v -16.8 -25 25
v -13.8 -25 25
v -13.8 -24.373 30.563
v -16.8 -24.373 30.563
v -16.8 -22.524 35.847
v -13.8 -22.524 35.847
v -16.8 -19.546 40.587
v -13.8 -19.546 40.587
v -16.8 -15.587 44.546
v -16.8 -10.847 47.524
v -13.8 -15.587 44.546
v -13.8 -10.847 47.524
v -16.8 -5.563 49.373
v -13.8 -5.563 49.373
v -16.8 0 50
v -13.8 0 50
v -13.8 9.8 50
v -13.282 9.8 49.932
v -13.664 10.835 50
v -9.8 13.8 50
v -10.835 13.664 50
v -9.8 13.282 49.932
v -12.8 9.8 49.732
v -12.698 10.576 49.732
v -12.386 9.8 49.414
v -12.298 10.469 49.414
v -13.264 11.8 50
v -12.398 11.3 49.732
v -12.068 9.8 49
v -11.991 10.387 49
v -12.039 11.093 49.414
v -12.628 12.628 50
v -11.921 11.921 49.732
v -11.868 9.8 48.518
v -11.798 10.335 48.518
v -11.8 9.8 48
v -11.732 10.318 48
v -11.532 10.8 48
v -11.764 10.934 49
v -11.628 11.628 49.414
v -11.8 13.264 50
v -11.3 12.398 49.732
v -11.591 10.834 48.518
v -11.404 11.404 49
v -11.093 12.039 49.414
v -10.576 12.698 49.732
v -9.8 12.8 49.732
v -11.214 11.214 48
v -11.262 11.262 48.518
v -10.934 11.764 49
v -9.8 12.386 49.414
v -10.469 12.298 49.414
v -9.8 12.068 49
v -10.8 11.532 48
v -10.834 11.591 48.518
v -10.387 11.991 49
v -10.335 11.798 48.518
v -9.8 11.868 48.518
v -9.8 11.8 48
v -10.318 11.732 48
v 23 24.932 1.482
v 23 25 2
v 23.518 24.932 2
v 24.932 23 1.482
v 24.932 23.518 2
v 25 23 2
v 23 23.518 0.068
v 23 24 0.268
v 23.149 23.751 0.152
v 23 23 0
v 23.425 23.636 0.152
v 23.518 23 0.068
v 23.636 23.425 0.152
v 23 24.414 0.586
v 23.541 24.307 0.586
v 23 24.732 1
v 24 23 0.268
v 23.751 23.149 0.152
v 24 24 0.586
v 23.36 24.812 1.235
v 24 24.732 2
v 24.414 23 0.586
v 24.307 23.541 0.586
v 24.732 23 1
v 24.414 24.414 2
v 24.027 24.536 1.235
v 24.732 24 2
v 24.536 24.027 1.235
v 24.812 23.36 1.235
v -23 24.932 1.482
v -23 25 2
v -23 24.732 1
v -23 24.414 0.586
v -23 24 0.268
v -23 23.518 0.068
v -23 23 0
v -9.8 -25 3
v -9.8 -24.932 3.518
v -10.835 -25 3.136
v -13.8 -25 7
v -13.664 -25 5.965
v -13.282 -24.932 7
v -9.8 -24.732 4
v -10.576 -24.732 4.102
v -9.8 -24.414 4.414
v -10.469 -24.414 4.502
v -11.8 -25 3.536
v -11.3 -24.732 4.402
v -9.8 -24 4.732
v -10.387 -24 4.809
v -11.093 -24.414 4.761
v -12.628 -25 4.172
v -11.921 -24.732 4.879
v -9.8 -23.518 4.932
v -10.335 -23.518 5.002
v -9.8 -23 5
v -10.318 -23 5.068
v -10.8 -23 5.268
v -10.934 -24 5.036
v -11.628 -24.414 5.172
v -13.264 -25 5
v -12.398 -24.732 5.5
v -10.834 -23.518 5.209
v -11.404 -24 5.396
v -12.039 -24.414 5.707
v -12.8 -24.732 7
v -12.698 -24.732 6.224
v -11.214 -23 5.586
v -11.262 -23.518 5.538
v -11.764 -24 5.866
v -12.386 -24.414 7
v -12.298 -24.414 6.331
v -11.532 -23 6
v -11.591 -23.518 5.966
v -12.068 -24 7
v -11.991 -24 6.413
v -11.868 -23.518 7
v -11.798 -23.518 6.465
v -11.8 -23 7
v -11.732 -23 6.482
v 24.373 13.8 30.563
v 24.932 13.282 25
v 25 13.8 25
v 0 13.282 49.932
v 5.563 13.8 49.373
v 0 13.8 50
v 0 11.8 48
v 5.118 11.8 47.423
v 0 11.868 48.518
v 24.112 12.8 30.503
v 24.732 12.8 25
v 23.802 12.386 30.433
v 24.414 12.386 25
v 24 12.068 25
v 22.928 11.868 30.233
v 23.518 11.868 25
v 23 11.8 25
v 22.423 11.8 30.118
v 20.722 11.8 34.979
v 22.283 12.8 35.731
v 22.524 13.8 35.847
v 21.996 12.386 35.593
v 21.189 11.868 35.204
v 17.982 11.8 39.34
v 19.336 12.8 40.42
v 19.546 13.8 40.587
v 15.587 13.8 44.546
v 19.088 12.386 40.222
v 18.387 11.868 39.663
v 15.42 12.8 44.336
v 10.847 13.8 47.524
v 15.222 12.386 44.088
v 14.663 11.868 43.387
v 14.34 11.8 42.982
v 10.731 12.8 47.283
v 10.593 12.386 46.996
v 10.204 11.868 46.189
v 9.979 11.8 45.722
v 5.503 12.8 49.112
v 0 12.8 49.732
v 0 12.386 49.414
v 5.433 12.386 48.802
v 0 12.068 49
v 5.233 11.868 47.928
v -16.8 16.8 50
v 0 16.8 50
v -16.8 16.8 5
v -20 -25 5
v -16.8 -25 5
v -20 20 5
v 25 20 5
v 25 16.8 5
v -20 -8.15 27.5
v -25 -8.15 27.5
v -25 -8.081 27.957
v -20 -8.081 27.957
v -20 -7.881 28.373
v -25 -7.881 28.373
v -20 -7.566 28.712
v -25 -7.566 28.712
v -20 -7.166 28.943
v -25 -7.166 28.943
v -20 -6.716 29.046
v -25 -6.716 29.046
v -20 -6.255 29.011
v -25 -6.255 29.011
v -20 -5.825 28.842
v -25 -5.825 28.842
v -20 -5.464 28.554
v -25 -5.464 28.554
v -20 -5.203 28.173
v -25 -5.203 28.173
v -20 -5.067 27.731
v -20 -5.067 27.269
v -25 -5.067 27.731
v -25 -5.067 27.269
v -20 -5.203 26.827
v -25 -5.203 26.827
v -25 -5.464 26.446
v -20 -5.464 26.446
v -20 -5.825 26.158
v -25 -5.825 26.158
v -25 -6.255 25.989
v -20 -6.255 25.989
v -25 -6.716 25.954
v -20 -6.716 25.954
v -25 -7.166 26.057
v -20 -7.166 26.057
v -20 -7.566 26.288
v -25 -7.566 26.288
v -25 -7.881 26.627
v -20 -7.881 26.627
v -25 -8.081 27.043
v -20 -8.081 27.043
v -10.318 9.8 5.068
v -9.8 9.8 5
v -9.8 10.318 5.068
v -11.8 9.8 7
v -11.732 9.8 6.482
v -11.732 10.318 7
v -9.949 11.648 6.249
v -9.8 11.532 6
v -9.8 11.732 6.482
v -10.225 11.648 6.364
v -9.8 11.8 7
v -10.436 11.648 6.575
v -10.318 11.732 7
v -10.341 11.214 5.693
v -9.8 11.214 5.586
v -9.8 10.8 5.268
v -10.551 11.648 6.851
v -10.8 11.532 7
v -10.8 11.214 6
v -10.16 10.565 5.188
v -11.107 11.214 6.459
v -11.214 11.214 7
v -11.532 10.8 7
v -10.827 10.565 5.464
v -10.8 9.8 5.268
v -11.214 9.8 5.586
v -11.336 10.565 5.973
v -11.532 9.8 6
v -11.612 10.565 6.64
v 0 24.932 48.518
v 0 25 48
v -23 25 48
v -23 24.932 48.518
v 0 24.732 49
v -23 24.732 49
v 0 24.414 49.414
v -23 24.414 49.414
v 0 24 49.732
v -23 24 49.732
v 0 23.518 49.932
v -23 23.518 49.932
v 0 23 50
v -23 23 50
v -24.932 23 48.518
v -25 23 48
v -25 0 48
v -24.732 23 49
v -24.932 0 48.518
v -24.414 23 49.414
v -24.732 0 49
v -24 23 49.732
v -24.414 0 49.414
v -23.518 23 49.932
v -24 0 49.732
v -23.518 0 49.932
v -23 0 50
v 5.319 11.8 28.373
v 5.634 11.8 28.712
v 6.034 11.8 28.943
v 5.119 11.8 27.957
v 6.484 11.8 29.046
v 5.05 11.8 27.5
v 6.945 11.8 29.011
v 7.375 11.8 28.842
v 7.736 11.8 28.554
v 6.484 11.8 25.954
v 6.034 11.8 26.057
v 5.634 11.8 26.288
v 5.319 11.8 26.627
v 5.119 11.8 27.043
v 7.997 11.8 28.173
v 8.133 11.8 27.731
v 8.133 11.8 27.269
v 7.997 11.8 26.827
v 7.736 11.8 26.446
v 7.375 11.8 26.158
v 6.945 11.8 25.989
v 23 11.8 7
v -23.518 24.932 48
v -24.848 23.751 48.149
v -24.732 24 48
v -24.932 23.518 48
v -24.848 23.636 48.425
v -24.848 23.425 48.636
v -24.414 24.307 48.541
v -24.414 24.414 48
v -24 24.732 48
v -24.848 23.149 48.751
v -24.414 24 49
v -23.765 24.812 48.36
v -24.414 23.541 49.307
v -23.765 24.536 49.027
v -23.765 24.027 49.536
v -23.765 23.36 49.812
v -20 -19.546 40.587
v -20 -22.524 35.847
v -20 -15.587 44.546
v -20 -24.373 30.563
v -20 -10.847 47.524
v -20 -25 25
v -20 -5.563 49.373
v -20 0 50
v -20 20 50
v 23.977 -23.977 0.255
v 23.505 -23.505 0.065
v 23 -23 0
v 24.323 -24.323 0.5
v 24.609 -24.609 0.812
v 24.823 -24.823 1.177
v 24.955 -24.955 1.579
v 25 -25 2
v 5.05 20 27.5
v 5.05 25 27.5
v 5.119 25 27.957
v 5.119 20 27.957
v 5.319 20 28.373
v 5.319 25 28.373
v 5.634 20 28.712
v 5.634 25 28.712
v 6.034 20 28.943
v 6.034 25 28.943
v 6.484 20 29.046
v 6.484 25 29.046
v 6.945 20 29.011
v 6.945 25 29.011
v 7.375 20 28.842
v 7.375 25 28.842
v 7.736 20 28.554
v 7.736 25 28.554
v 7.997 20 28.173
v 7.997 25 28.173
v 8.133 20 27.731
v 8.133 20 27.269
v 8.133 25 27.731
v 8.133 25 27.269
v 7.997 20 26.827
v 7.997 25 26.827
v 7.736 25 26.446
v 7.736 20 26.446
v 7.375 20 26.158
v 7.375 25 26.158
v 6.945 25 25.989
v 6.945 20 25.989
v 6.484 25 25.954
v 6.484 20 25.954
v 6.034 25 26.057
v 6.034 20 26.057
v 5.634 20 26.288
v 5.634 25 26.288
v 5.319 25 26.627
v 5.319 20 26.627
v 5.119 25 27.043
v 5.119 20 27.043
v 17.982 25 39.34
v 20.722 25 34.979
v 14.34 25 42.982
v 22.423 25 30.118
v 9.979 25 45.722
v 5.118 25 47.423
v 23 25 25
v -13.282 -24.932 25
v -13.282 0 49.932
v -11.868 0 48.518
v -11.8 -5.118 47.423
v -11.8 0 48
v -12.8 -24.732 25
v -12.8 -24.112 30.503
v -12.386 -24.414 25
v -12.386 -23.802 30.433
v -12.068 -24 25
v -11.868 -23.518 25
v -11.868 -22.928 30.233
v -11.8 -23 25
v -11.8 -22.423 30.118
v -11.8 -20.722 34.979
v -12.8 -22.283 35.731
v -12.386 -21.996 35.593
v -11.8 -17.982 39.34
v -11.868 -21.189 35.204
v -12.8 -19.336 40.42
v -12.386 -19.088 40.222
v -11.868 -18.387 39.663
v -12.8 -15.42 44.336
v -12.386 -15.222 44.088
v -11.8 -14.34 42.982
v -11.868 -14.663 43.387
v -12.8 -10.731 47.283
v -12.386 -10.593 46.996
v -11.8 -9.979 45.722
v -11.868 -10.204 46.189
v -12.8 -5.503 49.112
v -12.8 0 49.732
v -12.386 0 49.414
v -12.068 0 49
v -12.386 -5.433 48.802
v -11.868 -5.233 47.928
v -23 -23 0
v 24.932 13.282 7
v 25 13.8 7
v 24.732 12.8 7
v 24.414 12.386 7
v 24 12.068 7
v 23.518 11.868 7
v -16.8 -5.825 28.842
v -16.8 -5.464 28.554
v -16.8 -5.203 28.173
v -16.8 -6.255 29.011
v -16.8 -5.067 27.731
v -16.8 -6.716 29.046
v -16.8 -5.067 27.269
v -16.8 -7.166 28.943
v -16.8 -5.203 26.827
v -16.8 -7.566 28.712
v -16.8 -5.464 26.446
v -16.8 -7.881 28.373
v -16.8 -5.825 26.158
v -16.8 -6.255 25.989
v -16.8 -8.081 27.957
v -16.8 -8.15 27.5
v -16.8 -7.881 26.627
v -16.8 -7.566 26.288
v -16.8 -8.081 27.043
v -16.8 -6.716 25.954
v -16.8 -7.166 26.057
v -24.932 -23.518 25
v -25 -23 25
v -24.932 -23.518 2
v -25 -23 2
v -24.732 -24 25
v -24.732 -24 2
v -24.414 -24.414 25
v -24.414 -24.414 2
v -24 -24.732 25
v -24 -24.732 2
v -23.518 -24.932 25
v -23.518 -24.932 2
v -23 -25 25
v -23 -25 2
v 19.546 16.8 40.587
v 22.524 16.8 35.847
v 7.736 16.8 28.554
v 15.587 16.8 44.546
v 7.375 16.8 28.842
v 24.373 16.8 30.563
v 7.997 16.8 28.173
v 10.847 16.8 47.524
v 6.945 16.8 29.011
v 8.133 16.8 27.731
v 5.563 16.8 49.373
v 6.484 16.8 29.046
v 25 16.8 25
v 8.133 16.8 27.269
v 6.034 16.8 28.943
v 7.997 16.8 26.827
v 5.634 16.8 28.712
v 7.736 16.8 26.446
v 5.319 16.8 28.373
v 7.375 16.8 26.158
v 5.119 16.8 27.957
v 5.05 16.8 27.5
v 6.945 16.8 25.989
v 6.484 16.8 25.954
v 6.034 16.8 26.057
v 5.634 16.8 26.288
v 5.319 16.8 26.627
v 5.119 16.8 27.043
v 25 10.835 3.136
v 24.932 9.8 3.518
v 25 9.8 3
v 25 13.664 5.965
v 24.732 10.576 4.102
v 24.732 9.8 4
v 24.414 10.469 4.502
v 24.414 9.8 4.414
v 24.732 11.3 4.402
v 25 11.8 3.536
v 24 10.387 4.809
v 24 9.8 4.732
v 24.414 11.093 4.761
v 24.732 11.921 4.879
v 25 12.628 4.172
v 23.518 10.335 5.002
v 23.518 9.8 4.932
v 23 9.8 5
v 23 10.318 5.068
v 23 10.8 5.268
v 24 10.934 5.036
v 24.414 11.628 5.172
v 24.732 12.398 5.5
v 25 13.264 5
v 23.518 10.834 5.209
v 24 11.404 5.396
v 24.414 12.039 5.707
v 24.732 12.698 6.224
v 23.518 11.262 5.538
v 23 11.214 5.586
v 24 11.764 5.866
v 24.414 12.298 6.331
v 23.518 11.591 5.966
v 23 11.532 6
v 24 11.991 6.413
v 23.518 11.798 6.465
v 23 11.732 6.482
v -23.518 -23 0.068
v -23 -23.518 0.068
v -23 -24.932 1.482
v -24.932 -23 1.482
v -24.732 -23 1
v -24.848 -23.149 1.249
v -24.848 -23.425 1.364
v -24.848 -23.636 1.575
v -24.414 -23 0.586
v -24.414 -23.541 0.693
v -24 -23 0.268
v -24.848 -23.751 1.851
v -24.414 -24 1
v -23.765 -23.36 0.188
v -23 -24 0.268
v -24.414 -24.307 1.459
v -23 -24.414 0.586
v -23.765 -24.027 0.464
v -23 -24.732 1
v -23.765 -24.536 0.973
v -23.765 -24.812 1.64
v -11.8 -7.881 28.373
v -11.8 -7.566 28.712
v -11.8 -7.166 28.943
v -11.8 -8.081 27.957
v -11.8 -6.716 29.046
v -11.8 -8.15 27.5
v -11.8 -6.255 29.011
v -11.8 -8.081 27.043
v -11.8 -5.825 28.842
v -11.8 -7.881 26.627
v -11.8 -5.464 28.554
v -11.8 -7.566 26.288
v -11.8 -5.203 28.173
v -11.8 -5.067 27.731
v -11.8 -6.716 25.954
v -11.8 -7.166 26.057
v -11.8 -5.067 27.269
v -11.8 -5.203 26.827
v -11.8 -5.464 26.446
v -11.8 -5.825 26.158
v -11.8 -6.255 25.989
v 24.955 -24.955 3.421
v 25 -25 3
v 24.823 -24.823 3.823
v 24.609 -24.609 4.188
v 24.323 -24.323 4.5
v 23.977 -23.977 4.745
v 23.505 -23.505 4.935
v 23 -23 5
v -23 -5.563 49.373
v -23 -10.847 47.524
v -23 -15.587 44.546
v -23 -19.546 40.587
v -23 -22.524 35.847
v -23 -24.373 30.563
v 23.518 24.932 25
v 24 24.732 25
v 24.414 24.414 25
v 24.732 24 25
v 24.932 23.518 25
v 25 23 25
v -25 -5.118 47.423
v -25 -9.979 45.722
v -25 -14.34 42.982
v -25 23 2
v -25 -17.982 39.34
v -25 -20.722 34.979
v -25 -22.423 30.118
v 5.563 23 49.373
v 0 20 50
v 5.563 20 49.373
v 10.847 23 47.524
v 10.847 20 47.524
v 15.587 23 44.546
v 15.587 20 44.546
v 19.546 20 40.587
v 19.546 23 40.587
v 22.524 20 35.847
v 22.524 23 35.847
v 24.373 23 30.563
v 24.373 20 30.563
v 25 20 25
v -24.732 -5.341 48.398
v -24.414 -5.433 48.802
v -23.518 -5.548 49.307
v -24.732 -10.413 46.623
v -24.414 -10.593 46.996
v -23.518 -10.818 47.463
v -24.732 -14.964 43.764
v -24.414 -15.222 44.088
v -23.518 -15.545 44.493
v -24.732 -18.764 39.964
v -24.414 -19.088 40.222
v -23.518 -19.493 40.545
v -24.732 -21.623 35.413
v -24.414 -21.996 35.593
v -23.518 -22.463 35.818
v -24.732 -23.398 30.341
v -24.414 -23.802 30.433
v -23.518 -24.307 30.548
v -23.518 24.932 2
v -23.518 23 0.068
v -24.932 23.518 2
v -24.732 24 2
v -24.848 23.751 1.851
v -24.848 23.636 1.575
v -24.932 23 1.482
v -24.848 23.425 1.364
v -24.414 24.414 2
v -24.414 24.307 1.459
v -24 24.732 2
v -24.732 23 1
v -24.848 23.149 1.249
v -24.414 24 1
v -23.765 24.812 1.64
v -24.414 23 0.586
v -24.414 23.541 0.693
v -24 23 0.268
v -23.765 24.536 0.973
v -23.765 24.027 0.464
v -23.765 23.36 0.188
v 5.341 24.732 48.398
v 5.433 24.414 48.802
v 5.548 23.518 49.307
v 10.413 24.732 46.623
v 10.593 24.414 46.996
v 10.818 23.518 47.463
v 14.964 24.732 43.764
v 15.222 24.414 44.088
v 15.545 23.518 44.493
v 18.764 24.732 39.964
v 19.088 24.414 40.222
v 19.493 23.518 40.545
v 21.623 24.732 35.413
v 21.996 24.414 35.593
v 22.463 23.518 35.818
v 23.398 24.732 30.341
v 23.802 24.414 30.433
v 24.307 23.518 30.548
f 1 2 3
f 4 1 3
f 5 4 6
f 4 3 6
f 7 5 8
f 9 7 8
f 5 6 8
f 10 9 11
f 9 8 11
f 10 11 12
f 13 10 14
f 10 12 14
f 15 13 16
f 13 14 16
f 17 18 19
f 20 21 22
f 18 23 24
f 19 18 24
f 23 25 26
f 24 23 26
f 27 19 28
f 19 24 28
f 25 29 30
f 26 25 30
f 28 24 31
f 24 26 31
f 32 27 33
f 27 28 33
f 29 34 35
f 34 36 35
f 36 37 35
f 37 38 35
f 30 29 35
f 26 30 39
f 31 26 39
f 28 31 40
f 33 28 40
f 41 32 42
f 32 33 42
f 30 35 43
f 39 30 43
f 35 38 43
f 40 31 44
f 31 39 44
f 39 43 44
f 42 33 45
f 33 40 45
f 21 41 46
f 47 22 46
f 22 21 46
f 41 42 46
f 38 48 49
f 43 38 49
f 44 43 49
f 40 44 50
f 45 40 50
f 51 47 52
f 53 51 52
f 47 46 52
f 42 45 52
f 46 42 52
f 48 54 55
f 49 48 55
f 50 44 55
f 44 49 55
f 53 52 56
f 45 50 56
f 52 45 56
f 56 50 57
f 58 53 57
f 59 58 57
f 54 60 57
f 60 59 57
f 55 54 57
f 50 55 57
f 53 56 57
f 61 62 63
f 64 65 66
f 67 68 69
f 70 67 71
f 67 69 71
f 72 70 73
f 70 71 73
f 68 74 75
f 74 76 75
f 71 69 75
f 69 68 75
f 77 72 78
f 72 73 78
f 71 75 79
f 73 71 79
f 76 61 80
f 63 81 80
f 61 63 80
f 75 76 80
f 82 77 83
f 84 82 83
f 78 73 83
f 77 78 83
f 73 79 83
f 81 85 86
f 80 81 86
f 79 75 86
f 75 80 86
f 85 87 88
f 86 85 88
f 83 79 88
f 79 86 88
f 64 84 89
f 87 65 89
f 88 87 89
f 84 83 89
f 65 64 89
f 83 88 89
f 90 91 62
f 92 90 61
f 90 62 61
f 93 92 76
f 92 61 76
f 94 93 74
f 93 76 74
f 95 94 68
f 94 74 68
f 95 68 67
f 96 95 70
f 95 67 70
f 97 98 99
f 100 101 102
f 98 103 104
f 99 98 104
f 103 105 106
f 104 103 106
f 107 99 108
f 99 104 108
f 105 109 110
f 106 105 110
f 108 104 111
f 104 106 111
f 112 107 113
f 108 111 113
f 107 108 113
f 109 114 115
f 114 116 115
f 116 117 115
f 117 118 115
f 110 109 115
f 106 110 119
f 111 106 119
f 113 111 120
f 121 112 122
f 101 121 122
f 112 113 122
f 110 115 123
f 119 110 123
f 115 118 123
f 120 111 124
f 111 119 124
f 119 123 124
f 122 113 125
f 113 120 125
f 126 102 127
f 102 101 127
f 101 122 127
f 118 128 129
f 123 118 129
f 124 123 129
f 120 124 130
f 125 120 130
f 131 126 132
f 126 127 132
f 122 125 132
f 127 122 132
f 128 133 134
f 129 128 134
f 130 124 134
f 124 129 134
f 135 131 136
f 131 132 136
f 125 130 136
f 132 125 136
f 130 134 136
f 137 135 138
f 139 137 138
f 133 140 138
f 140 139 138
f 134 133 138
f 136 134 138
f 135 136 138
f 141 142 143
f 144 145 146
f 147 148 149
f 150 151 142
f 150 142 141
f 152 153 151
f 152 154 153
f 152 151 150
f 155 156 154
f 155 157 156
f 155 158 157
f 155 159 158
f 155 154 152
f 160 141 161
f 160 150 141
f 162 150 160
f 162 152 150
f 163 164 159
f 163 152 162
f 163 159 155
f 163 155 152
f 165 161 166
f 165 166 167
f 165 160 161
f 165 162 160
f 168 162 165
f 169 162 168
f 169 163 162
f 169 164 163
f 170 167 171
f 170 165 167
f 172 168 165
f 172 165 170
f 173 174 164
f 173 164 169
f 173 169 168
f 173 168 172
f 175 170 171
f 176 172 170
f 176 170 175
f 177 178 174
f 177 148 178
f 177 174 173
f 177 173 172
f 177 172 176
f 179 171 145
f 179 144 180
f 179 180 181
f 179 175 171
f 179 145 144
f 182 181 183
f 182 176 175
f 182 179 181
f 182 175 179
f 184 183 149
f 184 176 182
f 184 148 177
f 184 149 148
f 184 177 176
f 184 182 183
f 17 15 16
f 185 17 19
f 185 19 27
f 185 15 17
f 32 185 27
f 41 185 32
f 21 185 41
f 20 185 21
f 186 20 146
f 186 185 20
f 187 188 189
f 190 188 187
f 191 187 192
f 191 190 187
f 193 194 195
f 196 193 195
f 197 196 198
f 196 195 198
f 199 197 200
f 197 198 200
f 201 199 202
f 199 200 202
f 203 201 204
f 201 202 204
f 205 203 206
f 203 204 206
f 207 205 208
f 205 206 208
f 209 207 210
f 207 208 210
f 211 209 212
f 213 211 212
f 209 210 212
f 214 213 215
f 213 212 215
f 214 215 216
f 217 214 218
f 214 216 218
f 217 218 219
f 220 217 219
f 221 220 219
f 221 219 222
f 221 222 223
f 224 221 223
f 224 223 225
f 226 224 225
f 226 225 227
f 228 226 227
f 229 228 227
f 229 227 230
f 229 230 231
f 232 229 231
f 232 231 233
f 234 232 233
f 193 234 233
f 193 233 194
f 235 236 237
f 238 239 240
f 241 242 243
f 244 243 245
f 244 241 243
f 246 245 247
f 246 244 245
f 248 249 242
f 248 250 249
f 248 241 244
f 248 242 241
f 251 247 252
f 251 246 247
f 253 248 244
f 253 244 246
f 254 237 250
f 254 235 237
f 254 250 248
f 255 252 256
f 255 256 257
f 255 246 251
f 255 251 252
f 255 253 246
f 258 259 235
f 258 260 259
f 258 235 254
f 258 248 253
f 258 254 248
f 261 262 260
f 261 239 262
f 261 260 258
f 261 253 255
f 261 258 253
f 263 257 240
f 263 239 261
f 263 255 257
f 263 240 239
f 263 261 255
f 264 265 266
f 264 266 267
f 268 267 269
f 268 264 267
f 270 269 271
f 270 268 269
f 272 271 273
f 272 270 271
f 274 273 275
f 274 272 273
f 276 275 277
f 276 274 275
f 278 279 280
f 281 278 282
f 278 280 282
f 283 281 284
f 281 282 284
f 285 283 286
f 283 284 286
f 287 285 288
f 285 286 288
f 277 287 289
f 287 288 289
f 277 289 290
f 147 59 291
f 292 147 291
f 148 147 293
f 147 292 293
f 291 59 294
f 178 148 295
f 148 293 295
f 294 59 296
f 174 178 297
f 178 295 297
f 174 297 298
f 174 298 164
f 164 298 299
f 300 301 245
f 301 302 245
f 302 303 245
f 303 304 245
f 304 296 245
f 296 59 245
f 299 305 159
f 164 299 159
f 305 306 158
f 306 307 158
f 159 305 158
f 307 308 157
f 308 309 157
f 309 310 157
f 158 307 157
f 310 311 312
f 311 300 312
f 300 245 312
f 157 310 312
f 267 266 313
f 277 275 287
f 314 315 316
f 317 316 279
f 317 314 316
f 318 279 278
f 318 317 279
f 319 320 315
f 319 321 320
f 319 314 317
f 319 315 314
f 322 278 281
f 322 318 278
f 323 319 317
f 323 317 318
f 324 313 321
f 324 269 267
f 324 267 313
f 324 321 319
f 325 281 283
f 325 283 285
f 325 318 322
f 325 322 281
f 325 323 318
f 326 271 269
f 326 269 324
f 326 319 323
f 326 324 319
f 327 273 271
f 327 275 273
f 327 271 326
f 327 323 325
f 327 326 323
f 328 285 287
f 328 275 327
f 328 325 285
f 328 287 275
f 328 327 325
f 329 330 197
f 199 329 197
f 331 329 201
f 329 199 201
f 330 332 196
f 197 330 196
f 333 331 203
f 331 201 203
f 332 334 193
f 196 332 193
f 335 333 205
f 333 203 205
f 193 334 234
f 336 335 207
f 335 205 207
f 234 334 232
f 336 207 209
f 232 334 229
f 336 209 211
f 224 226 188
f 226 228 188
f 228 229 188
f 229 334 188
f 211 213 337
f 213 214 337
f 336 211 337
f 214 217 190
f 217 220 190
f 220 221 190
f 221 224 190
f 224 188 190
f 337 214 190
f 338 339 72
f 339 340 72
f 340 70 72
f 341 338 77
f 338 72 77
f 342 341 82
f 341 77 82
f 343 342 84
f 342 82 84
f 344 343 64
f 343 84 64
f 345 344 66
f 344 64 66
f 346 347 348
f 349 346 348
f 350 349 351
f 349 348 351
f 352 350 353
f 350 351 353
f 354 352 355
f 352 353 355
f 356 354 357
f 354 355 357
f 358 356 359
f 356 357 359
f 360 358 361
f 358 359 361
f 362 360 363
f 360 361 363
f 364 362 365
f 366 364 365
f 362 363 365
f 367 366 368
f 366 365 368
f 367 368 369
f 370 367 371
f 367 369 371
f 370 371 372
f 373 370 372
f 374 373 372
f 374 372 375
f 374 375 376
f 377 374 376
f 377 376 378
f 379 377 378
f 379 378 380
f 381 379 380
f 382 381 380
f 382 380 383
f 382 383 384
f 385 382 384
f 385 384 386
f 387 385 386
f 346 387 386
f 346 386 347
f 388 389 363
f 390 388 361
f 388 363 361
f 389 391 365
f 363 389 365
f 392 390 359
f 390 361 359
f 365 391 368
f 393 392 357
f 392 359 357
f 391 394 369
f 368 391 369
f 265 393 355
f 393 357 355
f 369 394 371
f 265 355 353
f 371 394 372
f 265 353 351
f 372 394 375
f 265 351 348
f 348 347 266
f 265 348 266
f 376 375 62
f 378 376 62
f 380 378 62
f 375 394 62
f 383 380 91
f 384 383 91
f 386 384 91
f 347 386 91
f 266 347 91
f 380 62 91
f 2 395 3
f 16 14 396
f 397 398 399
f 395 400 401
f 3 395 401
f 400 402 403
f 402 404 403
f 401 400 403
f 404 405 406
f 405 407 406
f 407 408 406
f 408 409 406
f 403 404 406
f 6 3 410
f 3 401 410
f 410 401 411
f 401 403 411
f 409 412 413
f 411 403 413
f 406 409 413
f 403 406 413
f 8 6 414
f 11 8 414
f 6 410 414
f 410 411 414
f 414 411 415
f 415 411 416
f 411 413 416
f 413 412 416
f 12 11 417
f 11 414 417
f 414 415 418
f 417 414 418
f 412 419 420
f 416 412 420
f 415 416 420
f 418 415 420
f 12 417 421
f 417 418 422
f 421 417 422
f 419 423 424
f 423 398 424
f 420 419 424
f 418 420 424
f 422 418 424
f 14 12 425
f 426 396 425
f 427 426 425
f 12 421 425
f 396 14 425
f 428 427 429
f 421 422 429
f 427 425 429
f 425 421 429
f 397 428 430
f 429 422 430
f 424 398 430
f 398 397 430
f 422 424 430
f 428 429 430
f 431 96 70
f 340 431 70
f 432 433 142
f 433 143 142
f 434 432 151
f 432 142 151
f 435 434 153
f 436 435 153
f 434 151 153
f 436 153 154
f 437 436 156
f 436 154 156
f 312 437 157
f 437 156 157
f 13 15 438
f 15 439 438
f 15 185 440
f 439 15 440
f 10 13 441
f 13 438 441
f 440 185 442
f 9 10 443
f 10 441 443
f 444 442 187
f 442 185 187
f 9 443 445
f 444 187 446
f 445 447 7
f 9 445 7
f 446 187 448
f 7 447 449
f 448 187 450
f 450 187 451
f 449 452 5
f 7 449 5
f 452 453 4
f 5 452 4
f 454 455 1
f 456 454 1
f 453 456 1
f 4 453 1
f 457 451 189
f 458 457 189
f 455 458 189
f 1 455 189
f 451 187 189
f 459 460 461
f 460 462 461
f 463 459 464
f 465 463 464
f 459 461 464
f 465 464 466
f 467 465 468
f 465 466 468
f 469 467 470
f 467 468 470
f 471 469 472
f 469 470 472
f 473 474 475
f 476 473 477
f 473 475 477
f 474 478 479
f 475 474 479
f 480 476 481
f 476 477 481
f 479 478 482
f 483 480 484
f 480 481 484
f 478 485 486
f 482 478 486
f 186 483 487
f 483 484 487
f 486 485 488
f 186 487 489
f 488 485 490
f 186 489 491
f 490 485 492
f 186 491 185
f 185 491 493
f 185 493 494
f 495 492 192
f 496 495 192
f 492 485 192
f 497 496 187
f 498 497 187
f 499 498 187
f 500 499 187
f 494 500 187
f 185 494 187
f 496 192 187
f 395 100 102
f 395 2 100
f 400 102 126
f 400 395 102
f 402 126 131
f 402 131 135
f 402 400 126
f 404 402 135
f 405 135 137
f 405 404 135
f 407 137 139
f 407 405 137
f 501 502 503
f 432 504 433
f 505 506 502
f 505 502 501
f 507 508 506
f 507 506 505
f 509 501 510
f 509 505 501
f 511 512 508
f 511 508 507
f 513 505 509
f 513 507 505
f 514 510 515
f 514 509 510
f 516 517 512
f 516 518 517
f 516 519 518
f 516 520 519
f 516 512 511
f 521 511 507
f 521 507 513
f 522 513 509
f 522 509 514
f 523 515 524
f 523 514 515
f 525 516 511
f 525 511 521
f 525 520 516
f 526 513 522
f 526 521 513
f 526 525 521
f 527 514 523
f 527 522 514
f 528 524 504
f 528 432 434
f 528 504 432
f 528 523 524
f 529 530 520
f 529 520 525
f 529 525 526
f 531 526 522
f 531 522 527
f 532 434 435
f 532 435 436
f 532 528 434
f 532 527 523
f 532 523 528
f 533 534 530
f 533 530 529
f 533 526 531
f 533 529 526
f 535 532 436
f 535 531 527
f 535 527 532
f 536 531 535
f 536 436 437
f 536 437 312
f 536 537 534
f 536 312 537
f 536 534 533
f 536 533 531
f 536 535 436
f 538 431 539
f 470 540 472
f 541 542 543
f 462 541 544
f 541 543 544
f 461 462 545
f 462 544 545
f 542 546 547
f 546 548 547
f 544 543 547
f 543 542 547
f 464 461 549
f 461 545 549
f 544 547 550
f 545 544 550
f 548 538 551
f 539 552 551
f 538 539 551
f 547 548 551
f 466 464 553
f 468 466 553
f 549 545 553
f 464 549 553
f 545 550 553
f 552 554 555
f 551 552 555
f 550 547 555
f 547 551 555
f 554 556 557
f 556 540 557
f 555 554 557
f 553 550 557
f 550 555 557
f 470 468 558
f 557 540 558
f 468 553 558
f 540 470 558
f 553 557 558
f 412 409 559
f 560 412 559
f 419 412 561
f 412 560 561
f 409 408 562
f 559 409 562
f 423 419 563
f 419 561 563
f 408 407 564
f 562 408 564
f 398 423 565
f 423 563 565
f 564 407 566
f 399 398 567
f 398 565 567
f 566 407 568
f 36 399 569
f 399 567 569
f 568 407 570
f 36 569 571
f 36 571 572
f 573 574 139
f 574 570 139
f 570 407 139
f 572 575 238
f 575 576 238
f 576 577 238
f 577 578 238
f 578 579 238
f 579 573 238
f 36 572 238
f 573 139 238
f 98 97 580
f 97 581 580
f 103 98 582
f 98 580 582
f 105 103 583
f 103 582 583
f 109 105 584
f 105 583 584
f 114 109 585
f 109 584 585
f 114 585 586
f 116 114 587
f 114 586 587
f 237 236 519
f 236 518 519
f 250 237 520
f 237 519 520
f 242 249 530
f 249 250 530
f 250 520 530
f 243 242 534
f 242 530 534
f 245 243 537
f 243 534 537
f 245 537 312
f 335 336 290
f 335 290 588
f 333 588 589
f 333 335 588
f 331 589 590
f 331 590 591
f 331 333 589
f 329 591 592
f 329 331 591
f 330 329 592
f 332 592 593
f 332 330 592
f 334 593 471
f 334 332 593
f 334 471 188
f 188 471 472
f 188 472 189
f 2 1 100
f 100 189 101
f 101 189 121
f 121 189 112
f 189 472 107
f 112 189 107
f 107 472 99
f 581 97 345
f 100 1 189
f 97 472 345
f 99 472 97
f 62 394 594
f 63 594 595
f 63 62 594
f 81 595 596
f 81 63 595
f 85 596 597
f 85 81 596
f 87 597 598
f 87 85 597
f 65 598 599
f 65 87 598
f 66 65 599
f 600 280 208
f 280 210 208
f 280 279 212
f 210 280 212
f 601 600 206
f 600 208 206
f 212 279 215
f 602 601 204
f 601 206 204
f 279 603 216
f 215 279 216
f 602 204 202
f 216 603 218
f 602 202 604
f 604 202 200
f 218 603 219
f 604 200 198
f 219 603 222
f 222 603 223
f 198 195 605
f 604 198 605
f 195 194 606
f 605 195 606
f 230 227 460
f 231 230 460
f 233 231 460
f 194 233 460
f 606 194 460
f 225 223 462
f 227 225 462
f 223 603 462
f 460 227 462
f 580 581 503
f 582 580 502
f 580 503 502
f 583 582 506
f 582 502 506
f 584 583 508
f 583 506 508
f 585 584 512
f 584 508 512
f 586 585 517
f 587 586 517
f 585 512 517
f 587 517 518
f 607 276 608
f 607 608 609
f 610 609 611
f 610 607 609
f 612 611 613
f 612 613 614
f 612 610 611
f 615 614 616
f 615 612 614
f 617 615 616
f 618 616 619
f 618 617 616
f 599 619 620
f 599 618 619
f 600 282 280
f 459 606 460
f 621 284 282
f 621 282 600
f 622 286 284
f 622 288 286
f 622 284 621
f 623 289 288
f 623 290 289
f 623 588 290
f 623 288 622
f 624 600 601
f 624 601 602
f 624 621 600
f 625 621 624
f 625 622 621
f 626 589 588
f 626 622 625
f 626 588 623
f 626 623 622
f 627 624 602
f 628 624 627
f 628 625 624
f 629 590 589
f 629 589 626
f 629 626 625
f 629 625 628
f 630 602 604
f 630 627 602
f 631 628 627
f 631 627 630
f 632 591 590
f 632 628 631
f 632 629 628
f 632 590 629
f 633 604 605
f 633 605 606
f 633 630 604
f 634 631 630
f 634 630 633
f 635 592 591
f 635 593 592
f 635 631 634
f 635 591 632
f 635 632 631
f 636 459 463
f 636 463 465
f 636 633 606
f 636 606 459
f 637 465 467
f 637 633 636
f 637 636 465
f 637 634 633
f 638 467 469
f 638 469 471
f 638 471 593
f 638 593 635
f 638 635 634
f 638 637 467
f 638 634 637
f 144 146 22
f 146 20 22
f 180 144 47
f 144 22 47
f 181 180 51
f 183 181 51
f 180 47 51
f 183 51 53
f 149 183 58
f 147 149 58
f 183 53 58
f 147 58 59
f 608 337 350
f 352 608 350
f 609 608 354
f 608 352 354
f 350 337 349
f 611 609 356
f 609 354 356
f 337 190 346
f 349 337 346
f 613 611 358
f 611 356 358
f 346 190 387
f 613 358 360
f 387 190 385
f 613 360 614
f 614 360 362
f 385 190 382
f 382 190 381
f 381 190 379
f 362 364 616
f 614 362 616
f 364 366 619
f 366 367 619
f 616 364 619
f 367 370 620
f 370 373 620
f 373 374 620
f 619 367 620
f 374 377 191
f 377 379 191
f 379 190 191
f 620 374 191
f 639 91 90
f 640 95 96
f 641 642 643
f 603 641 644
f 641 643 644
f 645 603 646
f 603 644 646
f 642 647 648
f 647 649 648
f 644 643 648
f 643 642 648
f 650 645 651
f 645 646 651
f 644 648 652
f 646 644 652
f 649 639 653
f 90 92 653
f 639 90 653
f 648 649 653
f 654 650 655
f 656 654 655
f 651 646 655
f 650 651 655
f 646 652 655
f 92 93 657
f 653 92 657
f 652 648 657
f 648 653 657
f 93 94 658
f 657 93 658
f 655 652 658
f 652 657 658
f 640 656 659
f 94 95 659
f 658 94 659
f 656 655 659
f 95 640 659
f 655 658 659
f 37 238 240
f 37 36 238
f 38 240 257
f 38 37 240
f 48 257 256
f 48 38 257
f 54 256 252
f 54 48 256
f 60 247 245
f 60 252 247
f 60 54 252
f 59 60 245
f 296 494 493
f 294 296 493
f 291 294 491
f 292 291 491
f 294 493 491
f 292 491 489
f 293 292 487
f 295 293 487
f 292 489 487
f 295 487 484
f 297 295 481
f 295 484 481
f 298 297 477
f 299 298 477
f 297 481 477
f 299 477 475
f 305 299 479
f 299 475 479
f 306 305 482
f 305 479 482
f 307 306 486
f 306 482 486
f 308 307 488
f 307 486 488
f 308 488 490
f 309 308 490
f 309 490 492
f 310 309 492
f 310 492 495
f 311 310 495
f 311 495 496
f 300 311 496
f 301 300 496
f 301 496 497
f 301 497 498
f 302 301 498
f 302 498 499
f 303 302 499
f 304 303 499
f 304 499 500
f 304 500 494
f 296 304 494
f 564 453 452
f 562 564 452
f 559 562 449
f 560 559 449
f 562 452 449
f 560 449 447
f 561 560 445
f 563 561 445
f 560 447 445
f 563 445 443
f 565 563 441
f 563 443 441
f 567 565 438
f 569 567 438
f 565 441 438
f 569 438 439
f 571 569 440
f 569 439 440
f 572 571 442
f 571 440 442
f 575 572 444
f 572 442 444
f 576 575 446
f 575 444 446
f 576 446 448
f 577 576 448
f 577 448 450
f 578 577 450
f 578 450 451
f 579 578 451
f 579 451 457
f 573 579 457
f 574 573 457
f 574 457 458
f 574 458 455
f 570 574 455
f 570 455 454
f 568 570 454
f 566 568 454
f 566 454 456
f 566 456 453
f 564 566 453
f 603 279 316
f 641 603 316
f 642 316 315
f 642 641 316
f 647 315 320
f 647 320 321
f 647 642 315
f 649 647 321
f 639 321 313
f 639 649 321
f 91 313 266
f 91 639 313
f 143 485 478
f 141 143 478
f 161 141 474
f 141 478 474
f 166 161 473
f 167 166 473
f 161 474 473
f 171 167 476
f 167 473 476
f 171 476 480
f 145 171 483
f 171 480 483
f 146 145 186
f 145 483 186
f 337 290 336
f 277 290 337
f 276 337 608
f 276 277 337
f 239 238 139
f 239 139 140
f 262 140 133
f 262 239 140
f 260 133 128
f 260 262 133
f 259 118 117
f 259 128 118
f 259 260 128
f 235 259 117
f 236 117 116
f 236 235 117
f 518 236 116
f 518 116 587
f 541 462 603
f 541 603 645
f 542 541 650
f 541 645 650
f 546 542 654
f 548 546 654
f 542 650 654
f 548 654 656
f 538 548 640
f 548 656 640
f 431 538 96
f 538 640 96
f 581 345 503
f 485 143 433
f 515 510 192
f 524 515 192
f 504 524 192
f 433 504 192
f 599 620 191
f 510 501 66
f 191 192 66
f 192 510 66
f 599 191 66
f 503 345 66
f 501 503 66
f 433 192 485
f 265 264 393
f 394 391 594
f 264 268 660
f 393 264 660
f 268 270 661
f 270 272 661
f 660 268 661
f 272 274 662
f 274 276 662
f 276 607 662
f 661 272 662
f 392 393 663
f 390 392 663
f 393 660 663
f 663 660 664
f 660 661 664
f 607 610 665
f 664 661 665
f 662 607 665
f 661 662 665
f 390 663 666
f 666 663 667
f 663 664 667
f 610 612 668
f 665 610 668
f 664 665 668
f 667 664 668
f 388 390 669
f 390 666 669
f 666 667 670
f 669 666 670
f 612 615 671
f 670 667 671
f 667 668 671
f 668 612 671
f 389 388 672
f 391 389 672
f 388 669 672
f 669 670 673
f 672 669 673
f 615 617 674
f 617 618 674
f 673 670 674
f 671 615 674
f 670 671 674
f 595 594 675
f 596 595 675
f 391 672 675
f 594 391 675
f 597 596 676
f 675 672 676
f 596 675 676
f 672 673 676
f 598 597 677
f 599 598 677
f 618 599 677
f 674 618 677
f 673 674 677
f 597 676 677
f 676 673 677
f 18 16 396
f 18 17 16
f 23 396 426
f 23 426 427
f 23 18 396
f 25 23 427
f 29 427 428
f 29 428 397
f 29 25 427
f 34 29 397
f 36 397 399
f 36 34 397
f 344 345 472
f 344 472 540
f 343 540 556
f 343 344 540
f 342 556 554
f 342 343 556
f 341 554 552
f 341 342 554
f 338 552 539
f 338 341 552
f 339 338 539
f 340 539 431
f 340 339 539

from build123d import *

# Parameters (mm, degrees)
F0_W            = 50
F0_H            = 50
F1_DEPTH        = 5
F2_W            = 45
F2_H            = 5
F3_DEPTH        = 45
F4_W            = 36.8
F4_H            = 5
F5_DEPTH        = 45
F6_R            = 25
F7_R            = 2
F10_D           = 3.1
F10_DEPTH       = 20
F10_TIP         = 0.9313339595
F10_ON_F9_D     = 3.1
F10_ON_F9_DEPTH = 20
F10_ON_F9_TIP   = 0.9313339595


with BuildPart() as f1:
    # F0 (on Top) → F1 (new body)
    with BuildSketch(Plane.XY):
        Rectangle(F0_W, F0_H)
    extrude(amount=F1_DEPTH)

    # F2 (on face) → F3 (join)
    with BuildSketch(Plane.XY.offset(5)):
        Polygon((-20, 25), (-25, 25), (-25, -25), (-20, -25), (-20, 20), align=None)
        with Locations((2.5, 22.5)):
            Rectangle(F2_W, F2_H)
    extrude(amount=F3_DEPTH)

    # F4 (on face) → F5 (join, through all)
    with BuildSketch(Plane.XY.offset(5)):
        Polygon((-16.8, 16.8), (-16.8, -25), (-11.8, -25), (-11.8, 11.8), (-11.8, 16.8), align=None)
        with Locations((6.6, 14.3)):
            Rectangle(F4_W, F4_H)
    extrude(amount=F5_DEPTH)

    # F6
    f6_edges = [f1.edges().sort_by_distance(p)[0] for p in [
        (-22.5, -25, 50),
        (-14.3, -25, 50),
        (25, 14.3, 50),
        (25, 22.5, 50),
    ]]
    fillet(f6_edges, radius=F6_R)

    # F7
    f7_edges = [f1.edges().sort_by_distance(p)[0] for p in [
        (25, 25, 12.5),
        (17.67767, 25, 42.67767),
        (0, 25, 0),
        (-12.5, 25, 50),
        (-25, 25, 25),
        (0, -25, 0),
        (25, 0, 0),
        (-25, 0, 0),
        (-25, 12.5, 50),
        (-25, -17.67767, 42.67767),
        (-25, -25, 12.5),
        (-11.8, -6.6, 5),
        (6.6, 11.8, 5),
        (25, -6.6, 5),
        (6.6, -25, 5),
        (-11.8, 11.8, 27.5),
        (-11.8, -25, 15),
        (25, 11.8, 15),
        (-11.8, -17.67767, 42.67767),
        (-11.8, 5.9, 50),
        (17.67767, 11.8, 42.67767),
        (-5.9, 11.8, 50),
    ]]
    fillet(f7_edges, radius=F7_R)

    # F10
    with Locations(Plane.YZ.offset(-11.8)):
        with Locations((-6.6, 27.5)):
            Hole(F10_D / 2, depth=F10_DEPTH)
            with Locations((0, 0, -(F10_DEPTH + F10_TIP / 2))):  # 118° drill point
                Cone(0, F10_D / 2, F10_TIP, mode=Mode.SUBTRACT)

    # F10 on F9
    with Locations(Plane.XZ.offset(-11.8)):
        with Locations((6.6, 27.5)):
            Hole(F10_ON_F9_D / 2, depth=F10_ON_F9_DEPTH)
            with Locations((0, 0, -(F10_ON_F9_DEPTH + F10_ON_F9_TIP / 2))):  # 118° drill point
                Cone(0, F10_ON_F9_D / 2, F10_ON_F9_TIP, mode=Mode.SUBTRACT)


solid = f1.part
